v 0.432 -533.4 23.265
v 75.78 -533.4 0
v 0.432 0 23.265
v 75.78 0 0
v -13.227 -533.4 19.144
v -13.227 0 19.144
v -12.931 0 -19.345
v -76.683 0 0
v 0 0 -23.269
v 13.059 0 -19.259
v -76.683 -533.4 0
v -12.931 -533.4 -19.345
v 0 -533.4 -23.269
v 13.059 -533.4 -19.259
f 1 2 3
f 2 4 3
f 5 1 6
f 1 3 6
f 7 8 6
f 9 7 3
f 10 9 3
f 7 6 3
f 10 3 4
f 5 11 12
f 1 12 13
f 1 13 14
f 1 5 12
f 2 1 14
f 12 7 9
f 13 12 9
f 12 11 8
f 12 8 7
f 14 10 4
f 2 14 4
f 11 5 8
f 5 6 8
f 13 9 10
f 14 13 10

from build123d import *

# Parameters (mm, degrees)
F1_DEPTH = 25.4
F2_DEPTH = 508


with BuildPart() as f1:
    # F0 (on Front) → F1 (new body)
    with BuildSketch(Plane.XZ):
        with BuildLine():
            Line((-23.26887446, 0), (23.26887446, 0))
            ThreePointArc((23.26887446, 0), (20.4736338233, 11.0576144219), (12.7594845956, 19.4585732131))
            Line((12.7594845956, 19.4585732131), (0.4321157806, 23.2648618003))
            Line((0.4321157806, 23.2648618003), (-13.2265486778, 19.1441617396))
            ThreePointArc((-13.2265486778, 19.1441617396), (-20.6059144344, 10.8091076855), (-23.26887446, 0))
        make_face()
        with BuildLine():
            Line((75.7796689868, 0), (23.26887446, 0))
            ThreePointArc((23.26887446, 0), (20.5584527971, -10.8991071756), (13.0586223544, -19.2590991701))
            Line((13.0586223544, -19.2590991701), (75.7796689868, 0))
        make_face()
        with BuildLine():
            ThreePointArc((12.7594845956, 19.4585732131), (20.4736338233, 11.0576144219), (23.26887446, 0))
            Line((23.26887446, 0), (75.7796689868, 0))
            Line((75.7796689868, 0), (12.7594845956, 19.4585732131))
        make_face()
        with BuildLine():
            ThreePointArc((13.0586223544, -19.2590991701), (20.5584527971, -10.8991071756), (23.26887446, 0))
            Line((23.26887446, 0), (-23.26887446, 0))
            ThreePointArc((-23.26887446, 0), (-20.5222893701, -10.9670487209), (-12.9309307101, -19.3450652521))
            Line((-12.9309307101, -19.3450652521), (0, -23.26887446))
            Line((0, -23.26887446), (13.0586223544, -19.2590991701))
        make_face()
        with BuildLine():
            Line((-76.6826793551, 0), (-23.26887446, 0))
            ThreePointArc((-23.26887446, 0), (-20.6059144344, 10.8091076855), (-13.2265486778, 19.1441617396))
            Line((-13.2265486778, 19.1441617396), (-76.6826793551, 0))
        make_face()
        with BuildLine():
            ThreePointArc((-12.9309307101, -19.3450652521), (-20.5222893701, -10.9670487209), (-23.26887446, 0))
            Line((-23.26887446, 0), (-76.6826793551, 0))
            Line((-76.6826793551, 0), (-12.9309307101, -19.3450652521))
        make_face()
    extrude(amount=F1_DEPTH)

    # F2 (add): a face of the model
    f2_faces = [f1.faces().sort_by_distance(p)[0] for p in [
        (-0.2289903697, -25.4, -0.0013375532),
    ]]
    extrude(f2_faces, amount=F2_DEPTH)


solid = f1.part
